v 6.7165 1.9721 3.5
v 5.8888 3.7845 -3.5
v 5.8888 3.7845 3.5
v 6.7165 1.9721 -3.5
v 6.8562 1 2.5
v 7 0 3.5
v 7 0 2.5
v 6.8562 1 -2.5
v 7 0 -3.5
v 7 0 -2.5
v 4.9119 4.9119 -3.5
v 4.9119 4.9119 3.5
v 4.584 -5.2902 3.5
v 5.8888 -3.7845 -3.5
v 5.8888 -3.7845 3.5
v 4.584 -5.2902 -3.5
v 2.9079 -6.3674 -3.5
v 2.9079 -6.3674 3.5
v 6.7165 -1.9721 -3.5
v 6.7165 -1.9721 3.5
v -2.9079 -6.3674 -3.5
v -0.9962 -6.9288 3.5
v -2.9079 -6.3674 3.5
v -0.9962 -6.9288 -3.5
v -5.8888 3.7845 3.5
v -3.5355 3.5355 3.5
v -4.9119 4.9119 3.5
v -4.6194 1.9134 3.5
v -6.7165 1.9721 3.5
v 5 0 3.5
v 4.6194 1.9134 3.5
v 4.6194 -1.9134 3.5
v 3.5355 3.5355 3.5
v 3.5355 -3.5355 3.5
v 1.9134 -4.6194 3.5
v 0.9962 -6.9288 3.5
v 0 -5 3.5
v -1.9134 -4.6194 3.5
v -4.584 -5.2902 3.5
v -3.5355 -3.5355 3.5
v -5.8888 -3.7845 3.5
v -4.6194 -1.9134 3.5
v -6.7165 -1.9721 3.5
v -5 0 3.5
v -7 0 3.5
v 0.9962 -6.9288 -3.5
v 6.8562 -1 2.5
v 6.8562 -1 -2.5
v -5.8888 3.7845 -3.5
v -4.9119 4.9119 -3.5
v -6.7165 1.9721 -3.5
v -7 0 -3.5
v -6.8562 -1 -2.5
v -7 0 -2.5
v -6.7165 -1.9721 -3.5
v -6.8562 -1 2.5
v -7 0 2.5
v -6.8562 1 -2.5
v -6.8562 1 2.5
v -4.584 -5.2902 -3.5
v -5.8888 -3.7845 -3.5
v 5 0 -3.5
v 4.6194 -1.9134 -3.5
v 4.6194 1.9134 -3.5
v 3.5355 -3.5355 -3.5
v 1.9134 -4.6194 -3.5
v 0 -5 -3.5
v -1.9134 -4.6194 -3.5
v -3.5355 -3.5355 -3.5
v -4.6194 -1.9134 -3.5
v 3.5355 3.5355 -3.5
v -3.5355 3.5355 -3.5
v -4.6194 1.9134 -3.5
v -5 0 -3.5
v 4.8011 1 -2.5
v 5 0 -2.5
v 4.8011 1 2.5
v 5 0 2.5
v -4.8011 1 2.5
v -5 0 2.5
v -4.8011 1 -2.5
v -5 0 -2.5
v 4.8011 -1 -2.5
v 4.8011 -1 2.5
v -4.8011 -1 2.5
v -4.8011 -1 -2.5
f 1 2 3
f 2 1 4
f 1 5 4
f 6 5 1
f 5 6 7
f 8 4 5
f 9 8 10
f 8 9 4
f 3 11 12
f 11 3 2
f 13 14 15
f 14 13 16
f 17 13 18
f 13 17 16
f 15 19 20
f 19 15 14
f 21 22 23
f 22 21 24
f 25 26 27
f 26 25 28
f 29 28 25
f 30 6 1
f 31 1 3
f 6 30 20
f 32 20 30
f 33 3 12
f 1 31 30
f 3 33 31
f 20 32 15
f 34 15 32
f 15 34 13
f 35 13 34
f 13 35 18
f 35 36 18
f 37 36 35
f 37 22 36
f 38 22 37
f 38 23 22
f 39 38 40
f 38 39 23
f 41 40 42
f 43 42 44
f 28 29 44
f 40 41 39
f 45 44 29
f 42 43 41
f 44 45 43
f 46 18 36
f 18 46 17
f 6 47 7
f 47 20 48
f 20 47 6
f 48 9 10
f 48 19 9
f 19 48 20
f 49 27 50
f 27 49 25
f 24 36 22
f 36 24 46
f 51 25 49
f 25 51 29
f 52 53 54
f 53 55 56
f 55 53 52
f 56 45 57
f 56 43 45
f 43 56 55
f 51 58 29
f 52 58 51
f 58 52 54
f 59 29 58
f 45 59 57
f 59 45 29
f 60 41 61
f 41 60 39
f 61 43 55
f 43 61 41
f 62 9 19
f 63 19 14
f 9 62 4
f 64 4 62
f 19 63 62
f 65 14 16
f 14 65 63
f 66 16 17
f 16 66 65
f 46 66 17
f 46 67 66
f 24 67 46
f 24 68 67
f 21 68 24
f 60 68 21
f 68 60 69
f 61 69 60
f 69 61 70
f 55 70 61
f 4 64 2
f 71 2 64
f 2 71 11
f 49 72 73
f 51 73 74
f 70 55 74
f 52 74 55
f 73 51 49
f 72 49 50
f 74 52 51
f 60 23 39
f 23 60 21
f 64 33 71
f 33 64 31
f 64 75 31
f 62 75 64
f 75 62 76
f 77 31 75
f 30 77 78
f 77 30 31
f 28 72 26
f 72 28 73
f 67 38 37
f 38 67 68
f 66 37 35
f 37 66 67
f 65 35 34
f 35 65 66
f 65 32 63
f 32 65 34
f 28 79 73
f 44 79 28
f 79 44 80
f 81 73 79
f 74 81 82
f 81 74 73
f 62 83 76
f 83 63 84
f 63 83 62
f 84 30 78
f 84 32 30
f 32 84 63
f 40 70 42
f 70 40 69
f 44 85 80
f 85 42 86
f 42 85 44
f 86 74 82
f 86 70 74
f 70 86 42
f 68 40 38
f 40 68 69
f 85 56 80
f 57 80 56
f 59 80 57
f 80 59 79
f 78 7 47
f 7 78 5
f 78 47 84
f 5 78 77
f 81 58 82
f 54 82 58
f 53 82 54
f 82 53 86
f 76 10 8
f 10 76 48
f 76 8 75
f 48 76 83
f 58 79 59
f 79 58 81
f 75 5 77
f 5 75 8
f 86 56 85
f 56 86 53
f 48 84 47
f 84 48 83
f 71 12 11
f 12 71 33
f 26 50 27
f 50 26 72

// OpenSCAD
// [FL_INDEX: keywords="openscad, 3d_parametric, cable_binder_zip_tie_cut-assistant, csg_solid" | COT="Parametric OpenSCAD design from 3DCodeverse"]
// Title: cable binder/zip tie cut-assistant

innerradius = 5; // [0:100]
wallthickness = 2; // [0:10]
radius = innerradius+wallthickness;

height = 7; // [0:15]

cable_binder_width_plus_margin = 5; // [0:10]
cable_binder_height_plus_margin = 2; // [0:10]
cable_binder_position_in_percent = 50; // [0:100]

open_top = "yes"; // [yes,no]
opening_angle = 90; // // [0:360]



// from http://rocklinux.net/pipermail/openscad/2012-August/003170.html
// whosawhatsis
module slice(r = 10, deg = 30) { 
	degn = (deg % 360 > 0) ? deg % 360 : deg % 360 + 360;
	difference() {
		circle(r);
		if (degn > 180) 
			intersection_for(a = [0, 180 - degn]) 
				rotate(a) 
					translate([-r, 0, 0]) 
						square(r * 2); 
		else 
			union() 
				for(a = [0, 180 - degn]) 
					rotate(a) 
						translate([-r, 0, 0]) 
							square(r * 2); 
	}
}



difference(){
	cylinder(h = height, r = radius, center = true);
	cylinder(h = height+2, r = innerradius, center = true);

	translate([0,-radius,0])
		translate([0,(radius*2)*cable_binder_position_in_percent/100, 0])
			cube(size = [radius*2, cable_binder_height_plus_margin, cable_binder_width_plus_margin], center = true);

if (open_top == "yes"){
	rotate(90 + opening_angle/2) 
	linear_extrude(height = height+2, center = true)
		slice(radius*2, opening_angle);
}

}
